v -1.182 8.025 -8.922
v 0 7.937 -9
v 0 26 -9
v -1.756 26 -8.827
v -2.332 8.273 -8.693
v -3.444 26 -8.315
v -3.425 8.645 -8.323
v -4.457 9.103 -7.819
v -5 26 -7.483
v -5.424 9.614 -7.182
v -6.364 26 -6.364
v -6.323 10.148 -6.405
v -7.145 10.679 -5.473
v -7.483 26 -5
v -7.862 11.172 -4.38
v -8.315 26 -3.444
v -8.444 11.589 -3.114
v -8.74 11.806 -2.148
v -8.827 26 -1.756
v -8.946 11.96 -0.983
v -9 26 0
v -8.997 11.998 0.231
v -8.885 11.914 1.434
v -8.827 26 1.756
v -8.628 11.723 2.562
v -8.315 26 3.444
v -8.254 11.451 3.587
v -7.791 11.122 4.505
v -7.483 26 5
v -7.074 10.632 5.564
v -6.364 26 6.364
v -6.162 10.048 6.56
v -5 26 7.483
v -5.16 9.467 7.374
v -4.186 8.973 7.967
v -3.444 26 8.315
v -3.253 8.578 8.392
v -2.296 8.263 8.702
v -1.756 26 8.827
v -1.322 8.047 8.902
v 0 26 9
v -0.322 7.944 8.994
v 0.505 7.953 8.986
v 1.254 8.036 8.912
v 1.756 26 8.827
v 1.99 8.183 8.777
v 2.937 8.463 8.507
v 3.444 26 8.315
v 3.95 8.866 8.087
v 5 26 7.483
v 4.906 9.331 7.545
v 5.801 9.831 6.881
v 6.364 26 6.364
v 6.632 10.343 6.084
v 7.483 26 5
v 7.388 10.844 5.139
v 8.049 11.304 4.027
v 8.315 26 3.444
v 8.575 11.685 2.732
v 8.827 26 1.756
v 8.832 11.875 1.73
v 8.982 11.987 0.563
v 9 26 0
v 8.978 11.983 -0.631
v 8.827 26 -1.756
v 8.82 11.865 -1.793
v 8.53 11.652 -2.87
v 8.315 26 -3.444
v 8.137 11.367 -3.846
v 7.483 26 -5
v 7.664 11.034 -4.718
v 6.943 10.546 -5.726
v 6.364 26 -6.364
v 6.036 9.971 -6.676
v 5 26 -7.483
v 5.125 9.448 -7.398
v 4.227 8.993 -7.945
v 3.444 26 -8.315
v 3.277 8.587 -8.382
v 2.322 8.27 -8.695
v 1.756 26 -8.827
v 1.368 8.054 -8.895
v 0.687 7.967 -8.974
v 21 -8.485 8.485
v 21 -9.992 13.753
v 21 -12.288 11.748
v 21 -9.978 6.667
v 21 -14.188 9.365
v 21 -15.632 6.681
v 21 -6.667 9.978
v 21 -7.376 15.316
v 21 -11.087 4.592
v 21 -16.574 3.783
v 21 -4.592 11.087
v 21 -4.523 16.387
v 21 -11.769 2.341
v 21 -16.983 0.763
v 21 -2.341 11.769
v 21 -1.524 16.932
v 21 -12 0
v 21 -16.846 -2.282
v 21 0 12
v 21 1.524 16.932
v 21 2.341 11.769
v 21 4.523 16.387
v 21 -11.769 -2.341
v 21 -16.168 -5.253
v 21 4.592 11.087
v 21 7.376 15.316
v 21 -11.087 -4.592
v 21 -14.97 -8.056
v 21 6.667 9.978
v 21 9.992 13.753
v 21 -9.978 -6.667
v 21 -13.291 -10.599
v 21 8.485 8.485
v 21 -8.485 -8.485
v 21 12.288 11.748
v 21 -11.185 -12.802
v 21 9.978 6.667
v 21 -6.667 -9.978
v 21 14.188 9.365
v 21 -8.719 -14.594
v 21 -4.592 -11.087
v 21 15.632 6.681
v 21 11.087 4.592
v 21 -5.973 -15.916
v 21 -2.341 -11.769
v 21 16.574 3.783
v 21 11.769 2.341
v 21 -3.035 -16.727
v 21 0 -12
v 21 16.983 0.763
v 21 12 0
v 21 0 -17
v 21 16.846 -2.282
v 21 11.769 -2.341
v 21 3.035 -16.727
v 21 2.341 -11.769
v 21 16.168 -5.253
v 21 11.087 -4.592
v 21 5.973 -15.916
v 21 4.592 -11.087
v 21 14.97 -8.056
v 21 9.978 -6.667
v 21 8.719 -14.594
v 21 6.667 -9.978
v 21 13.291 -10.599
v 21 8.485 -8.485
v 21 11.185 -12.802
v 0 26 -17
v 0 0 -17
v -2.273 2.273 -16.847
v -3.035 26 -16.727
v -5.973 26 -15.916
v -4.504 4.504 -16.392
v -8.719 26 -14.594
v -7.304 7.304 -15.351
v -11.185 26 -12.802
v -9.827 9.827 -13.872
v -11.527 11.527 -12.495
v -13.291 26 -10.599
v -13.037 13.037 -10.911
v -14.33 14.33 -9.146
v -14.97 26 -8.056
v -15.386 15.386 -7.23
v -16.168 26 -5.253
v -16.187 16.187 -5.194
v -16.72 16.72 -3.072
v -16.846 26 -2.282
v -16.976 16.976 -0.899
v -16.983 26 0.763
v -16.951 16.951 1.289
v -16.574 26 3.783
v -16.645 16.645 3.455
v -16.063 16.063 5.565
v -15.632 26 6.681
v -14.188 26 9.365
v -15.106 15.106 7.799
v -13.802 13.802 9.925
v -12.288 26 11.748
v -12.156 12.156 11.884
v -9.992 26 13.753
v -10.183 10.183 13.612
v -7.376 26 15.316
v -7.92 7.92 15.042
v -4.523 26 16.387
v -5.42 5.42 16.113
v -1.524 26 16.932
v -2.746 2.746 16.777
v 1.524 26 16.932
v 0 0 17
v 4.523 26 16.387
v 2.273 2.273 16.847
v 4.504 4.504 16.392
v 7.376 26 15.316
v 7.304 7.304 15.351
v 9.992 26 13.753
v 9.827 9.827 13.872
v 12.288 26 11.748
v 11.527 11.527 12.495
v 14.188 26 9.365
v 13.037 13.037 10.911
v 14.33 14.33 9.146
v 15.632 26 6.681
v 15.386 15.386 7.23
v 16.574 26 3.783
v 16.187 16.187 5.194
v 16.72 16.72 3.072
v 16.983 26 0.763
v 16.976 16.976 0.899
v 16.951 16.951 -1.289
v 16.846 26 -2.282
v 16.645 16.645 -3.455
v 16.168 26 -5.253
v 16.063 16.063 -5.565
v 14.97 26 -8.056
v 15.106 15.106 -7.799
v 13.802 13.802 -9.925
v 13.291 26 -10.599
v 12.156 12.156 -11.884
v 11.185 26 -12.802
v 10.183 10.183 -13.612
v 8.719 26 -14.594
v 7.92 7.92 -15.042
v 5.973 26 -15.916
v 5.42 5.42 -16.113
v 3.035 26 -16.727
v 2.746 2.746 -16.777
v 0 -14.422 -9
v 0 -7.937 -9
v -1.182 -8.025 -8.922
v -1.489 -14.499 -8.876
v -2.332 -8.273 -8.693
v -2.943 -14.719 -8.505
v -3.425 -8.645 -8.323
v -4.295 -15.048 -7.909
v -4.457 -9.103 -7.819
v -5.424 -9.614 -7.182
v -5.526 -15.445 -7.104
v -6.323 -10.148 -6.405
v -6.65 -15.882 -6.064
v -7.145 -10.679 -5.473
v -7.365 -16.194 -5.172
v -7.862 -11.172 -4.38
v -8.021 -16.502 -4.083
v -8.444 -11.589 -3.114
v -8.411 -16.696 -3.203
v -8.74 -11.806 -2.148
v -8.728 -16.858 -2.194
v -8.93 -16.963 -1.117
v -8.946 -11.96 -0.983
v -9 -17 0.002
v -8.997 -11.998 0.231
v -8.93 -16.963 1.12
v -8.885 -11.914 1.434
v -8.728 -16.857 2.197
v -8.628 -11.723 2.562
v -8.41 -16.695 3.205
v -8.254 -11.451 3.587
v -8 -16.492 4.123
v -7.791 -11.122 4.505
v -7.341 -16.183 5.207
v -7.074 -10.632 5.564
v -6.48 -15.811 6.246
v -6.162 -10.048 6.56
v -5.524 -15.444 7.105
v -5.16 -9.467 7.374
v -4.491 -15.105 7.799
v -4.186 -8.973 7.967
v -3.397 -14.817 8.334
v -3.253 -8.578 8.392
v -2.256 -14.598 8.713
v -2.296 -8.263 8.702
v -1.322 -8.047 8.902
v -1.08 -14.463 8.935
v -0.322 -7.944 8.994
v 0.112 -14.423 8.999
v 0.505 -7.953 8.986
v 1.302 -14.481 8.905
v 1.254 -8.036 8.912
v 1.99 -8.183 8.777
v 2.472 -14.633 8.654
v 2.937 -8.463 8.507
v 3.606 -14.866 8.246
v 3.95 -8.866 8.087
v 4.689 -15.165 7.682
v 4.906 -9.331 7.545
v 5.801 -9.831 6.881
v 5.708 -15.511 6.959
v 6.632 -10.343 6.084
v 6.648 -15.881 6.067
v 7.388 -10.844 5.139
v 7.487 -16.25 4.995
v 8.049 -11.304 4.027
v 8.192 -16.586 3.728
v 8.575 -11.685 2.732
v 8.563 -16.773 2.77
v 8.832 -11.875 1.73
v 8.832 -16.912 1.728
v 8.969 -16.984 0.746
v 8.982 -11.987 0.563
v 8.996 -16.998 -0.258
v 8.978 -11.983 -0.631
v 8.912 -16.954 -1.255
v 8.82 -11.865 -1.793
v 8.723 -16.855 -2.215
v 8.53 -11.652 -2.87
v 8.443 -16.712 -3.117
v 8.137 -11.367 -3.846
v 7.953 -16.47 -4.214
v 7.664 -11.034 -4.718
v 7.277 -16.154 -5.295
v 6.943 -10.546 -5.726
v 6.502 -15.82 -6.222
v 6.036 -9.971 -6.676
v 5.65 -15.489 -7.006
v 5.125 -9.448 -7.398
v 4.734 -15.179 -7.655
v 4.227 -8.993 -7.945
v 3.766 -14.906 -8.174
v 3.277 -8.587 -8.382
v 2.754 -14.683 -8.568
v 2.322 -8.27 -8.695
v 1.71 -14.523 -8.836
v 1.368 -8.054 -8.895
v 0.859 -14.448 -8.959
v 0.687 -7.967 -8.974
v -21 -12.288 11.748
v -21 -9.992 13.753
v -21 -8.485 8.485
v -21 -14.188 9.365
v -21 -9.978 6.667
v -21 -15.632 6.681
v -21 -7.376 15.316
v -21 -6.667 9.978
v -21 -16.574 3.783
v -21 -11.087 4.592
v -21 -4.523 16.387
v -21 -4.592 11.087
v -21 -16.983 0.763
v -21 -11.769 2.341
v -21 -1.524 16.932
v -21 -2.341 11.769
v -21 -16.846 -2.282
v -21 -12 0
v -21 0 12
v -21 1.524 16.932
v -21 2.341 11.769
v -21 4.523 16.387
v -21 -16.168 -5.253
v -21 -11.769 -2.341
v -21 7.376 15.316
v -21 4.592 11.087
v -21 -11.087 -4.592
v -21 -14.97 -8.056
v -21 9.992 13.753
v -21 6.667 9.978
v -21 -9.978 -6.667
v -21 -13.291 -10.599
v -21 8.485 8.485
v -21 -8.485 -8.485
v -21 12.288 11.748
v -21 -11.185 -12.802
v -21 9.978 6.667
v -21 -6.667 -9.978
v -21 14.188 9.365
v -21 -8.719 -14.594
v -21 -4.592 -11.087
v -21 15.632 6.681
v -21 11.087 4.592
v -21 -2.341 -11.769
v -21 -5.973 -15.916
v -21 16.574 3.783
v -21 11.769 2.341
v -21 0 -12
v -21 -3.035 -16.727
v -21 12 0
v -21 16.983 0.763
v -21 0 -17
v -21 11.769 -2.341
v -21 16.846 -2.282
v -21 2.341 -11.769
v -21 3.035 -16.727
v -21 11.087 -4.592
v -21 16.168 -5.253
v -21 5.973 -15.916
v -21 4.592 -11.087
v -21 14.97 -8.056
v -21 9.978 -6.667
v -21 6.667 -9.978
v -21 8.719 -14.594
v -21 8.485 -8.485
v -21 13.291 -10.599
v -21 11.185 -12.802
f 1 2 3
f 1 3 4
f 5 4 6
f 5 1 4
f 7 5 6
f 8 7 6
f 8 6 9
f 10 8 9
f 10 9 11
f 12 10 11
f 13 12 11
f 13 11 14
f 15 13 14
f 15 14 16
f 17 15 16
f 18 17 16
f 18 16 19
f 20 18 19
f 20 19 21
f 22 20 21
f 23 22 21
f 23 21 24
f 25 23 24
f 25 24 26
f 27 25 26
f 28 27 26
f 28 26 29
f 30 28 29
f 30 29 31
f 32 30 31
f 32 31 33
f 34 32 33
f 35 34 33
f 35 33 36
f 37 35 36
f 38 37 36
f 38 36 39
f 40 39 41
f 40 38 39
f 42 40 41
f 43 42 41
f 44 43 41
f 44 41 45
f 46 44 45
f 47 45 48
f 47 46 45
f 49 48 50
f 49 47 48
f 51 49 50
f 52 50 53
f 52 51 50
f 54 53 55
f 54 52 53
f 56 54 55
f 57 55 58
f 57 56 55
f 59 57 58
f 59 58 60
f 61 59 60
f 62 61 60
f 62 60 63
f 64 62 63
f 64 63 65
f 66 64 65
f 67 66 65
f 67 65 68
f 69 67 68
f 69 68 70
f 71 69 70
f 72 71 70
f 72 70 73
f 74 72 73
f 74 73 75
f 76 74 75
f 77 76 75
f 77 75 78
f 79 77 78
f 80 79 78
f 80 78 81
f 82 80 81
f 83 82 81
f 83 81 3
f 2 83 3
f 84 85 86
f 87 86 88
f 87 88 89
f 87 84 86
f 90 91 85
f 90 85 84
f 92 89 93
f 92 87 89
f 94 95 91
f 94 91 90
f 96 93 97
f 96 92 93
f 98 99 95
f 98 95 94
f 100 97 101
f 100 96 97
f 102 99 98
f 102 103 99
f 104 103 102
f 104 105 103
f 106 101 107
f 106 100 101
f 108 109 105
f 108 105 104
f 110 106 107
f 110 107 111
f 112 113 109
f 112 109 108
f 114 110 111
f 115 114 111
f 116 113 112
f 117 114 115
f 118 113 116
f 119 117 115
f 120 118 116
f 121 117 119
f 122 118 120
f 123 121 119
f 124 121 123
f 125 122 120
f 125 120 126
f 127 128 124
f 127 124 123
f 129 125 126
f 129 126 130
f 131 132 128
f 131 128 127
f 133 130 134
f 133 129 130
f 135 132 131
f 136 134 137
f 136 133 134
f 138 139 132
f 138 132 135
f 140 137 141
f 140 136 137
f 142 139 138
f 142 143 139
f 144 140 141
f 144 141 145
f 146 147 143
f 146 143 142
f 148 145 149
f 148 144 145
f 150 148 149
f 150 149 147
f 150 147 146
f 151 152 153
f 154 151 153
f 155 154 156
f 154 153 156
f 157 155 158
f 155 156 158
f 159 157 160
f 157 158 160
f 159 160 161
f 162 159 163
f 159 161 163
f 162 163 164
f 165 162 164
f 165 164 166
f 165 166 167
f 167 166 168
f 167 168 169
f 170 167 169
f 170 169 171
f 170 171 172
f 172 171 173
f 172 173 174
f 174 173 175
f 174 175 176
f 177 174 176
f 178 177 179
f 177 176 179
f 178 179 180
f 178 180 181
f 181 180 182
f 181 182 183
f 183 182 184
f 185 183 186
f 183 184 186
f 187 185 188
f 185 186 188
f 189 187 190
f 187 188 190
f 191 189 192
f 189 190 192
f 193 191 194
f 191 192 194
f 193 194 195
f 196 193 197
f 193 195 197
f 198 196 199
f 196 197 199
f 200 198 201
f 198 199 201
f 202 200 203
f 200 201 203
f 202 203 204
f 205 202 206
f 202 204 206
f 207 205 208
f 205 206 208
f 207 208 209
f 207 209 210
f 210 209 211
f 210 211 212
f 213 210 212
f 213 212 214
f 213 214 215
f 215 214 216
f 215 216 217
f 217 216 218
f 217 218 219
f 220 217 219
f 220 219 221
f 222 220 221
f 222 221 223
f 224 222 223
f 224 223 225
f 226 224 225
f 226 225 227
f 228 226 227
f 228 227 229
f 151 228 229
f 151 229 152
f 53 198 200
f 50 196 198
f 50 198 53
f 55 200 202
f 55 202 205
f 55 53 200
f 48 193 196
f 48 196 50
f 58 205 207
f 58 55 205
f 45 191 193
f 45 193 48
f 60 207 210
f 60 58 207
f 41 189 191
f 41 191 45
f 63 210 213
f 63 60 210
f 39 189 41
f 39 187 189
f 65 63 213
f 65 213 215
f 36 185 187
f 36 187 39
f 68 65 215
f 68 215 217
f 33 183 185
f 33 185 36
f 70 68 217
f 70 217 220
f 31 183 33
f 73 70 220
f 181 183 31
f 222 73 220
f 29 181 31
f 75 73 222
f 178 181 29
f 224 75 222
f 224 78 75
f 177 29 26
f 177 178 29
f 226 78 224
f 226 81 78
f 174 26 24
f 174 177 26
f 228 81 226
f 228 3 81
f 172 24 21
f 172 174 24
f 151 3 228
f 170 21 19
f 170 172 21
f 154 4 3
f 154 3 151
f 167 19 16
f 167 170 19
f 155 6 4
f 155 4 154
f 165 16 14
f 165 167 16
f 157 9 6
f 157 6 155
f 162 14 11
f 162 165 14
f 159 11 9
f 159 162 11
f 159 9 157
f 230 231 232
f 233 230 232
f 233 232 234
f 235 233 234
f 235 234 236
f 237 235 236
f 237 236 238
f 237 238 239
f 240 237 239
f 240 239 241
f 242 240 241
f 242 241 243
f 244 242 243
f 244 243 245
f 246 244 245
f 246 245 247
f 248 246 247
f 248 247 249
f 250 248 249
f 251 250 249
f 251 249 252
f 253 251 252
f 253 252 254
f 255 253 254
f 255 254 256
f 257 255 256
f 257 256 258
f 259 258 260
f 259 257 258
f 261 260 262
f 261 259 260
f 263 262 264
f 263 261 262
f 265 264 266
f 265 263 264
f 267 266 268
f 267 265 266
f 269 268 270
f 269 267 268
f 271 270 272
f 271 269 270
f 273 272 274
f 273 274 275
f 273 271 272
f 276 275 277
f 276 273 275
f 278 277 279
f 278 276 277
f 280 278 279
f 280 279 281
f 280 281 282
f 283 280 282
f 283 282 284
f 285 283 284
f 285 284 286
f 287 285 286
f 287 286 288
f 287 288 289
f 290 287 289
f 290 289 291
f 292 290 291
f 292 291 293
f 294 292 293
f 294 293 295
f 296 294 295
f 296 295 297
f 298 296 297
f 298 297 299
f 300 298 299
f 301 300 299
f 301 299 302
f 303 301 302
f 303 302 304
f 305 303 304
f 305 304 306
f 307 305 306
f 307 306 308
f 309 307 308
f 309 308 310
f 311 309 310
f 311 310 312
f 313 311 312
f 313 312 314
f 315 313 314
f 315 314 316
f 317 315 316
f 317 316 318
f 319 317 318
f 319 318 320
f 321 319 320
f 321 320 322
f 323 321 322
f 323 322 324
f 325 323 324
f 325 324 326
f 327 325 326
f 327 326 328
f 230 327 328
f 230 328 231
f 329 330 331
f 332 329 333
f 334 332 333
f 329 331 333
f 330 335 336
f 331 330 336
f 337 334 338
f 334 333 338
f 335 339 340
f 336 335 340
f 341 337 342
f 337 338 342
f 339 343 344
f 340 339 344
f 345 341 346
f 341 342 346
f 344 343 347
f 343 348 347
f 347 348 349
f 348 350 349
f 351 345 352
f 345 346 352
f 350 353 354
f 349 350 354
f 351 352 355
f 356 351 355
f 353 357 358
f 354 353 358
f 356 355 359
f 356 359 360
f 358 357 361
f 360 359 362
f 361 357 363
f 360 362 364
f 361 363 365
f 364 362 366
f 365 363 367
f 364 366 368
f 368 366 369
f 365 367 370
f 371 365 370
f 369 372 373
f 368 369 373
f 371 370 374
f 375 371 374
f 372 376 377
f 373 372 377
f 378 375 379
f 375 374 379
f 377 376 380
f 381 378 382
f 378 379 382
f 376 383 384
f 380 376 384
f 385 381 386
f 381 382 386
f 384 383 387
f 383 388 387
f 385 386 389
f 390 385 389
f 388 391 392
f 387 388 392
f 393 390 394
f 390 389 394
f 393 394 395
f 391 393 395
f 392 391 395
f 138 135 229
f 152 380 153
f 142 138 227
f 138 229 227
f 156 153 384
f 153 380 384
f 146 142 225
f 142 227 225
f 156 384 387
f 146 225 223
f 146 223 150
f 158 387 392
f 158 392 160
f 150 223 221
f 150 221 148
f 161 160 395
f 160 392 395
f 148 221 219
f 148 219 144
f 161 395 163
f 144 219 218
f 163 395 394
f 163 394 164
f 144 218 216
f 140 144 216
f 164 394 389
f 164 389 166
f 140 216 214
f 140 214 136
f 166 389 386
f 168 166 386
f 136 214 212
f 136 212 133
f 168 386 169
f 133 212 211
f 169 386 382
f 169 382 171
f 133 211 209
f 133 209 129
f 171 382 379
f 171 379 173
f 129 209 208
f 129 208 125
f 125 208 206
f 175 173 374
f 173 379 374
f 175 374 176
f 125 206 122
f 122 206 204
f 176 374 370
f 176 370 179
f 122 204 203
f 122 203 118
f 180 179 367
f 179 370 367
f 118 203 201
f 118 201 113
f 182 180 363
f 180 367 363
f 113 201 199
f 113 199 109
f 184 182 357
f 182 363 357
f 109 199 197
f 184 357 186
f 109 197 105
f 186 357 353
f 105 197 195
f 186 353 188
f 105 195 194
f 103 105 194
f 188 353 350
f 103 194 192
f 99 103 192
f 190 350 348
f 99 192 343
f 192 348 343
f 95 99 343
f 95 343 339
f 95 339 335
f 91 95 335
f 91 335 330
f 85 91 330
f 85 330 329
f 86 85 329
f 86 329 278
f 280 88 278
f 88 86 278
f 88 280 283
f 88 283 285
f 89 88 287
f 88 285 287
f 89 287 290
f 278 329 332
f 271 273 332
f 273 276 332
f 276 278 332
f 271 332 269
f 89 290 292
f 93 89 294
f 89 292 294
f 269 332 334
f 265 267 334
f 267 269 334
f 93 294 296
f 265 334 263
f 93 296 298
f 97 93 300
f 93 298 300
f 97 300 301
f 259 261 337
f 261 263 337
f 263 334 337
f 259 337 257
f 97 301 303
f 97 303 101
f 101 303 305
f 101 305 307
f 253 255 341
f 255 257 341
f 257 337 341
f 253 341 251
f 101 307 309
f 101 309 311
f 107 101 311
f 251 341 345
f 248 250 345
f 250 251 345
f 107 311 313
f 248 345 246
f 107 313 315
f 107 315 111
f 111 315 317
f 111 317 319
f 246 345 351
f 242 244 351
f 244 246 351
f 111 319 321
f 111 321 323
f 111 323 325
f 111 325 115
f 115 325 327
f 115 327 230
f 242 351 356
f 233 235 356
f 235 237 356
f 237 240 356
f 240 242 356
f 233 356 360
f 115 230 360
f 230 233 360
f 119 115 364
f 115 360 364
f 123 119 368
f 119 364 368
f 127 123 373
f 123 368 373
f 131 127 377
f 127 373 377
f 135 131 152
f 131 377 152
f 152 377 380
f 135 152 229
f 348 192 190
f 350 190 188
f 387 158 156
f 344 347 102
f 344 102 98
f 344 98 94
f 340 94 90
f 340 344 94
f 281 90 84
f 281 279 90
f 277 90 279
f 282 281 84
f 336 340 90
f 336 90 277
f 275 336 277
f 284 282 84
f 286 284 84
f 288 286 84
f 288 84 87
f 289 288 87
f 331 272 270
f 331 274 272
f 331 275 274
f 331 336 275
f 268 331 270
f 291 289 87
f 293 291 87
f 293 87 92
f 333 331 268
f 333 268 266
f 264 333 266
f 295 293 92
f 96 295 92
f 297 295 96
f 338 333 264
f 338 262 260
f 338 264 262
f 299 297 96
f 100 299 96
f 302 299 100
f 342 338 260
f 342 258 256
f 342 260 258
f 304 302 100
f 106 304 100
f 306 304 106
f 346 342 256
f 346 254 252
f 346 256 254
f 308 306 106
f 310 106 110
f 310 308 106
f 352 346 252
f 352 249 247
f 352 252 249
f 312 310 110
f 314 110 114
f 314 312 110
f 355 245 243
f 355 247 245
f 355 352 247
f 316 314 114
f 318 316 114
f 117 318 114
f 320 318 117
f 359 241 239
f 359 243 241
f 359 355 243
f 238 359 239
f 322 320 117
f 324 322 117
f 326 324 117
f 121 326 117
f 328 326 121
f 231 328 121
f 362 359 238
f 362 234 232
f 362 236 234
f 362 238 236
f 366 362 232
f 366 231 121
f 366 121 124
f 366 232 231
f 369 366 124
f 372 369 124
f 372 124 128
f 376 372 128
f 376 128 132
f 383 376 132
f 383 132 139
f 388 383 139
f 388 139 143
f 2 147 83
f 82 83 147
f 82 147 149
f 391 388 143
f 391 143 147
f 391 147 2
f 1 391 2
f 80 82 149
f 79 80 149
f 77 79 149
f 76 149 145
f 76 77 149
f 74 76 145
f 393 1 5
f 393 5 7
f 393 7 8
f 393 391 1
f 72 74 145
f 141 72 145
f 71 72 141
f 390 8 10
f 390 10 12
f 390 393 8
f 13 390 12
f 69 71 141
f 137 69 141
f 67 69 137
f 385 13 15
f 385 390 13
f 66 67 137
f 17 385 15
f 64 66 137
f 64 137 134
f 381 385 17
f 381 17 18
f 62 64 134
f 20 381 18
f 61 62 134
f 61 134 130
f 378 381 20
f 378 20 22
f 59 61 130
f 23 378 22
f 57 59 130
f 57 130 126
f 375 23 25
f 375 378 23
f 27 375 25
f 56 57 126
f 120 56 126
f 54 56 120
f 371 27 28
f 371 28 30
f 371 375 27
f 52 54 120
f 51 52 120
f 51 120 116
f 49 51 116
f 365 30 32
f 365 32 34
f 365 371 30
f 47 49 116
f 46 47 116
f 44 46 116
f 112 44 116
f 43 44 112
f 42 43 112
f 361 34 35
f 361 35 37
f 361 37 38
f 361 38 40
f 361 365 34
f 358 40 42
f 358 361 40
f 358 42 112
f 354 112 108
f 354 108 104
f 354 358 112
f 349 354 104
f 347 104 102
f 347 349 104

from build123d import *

# Parameters (mm, degrees)
SKETCH_1_R               = 17
EXTRUDE_1_DEPTH          = 26
EXTRUDE_2_DEPTH          = 21
EXTRUDE_2_DEPTH_BACK     = 21
SKETCH_2_R               = 17
CUT_EXTRUDE_2_DEPTH      = 21
CUT_EXTRUDE_2_DEPTH_BACK = 21
SKETCH_4_R               = 12
CUT_EXTRUDE_3_DEPTH      = 26
CUT_EXTRUDE_3_DEPTH_BACK = 17
SKETCH_5_R               = 9


with BuildPart() as part:
    # 草图1 → 凸台-拉伸1 (new body)
    with BuildSketch(Plane(origin=(0, 0, 0), x_dir=(1, 0, 0), z_dir=(0, 1, 0))):
        Circle(SKETCH_1_R)
    extrude(amount=EXTRUDE_1_DEPTH)

    # 草图2 → 凸台-拉伸2 (add, two sides: drawn at the far end of the back side and taken through both)
    with BuildSketch(Plane(origin=(0, 0, 0), x_dir=(0, 0, -1), z_dir=(1, 0, 0)).offset(-EXTRUDE_2_DEPTH_BACK)):
        Circle(SKETCH_2_R)
    extrude(amount=EXTRUDE_2_DEPTH + EXTRUDE_2_DEPTH_BACK)

    # 草图4 → 切除-拉伸2 (cut, two sides: drawn at the far end of the back side and taken through both)
    with BuildSketch(Plane(origin=(0, 0, 0), x_dir=(0, 0, -1), z_dir=(1, 0, 0)).offset(-CUT_EXTRUDE_2_DEPTH_BACK)):
        Circle(SKETCH_4_R)
    extrude(amount=CUT_EXTRUDE_2_DEPTH + CUT_EXTRUDE_2_DEPTH_BACK, mode=Mode.SUBTRACT)

    # 草图5 → 切除-拉伸3 (cut, two sides: drawn at the far end of the back side and taken through both)
    with BuildSketch(Plane(origin=(0, 0, 0), x_dir=(1, 0, 0), z_dir=(0, 1, 0)).offset(-CUT_EXTRUDE_3_DEPTH_BACK)):
        Circle(SKETCH_5_R)
    extrude(amount=CUT_EXTRUDE_3_DEPTH + CUT_EXTRUDE_3_DEPTH_BACK, mode=Mode.SUBTRACT)


solid = part.part
